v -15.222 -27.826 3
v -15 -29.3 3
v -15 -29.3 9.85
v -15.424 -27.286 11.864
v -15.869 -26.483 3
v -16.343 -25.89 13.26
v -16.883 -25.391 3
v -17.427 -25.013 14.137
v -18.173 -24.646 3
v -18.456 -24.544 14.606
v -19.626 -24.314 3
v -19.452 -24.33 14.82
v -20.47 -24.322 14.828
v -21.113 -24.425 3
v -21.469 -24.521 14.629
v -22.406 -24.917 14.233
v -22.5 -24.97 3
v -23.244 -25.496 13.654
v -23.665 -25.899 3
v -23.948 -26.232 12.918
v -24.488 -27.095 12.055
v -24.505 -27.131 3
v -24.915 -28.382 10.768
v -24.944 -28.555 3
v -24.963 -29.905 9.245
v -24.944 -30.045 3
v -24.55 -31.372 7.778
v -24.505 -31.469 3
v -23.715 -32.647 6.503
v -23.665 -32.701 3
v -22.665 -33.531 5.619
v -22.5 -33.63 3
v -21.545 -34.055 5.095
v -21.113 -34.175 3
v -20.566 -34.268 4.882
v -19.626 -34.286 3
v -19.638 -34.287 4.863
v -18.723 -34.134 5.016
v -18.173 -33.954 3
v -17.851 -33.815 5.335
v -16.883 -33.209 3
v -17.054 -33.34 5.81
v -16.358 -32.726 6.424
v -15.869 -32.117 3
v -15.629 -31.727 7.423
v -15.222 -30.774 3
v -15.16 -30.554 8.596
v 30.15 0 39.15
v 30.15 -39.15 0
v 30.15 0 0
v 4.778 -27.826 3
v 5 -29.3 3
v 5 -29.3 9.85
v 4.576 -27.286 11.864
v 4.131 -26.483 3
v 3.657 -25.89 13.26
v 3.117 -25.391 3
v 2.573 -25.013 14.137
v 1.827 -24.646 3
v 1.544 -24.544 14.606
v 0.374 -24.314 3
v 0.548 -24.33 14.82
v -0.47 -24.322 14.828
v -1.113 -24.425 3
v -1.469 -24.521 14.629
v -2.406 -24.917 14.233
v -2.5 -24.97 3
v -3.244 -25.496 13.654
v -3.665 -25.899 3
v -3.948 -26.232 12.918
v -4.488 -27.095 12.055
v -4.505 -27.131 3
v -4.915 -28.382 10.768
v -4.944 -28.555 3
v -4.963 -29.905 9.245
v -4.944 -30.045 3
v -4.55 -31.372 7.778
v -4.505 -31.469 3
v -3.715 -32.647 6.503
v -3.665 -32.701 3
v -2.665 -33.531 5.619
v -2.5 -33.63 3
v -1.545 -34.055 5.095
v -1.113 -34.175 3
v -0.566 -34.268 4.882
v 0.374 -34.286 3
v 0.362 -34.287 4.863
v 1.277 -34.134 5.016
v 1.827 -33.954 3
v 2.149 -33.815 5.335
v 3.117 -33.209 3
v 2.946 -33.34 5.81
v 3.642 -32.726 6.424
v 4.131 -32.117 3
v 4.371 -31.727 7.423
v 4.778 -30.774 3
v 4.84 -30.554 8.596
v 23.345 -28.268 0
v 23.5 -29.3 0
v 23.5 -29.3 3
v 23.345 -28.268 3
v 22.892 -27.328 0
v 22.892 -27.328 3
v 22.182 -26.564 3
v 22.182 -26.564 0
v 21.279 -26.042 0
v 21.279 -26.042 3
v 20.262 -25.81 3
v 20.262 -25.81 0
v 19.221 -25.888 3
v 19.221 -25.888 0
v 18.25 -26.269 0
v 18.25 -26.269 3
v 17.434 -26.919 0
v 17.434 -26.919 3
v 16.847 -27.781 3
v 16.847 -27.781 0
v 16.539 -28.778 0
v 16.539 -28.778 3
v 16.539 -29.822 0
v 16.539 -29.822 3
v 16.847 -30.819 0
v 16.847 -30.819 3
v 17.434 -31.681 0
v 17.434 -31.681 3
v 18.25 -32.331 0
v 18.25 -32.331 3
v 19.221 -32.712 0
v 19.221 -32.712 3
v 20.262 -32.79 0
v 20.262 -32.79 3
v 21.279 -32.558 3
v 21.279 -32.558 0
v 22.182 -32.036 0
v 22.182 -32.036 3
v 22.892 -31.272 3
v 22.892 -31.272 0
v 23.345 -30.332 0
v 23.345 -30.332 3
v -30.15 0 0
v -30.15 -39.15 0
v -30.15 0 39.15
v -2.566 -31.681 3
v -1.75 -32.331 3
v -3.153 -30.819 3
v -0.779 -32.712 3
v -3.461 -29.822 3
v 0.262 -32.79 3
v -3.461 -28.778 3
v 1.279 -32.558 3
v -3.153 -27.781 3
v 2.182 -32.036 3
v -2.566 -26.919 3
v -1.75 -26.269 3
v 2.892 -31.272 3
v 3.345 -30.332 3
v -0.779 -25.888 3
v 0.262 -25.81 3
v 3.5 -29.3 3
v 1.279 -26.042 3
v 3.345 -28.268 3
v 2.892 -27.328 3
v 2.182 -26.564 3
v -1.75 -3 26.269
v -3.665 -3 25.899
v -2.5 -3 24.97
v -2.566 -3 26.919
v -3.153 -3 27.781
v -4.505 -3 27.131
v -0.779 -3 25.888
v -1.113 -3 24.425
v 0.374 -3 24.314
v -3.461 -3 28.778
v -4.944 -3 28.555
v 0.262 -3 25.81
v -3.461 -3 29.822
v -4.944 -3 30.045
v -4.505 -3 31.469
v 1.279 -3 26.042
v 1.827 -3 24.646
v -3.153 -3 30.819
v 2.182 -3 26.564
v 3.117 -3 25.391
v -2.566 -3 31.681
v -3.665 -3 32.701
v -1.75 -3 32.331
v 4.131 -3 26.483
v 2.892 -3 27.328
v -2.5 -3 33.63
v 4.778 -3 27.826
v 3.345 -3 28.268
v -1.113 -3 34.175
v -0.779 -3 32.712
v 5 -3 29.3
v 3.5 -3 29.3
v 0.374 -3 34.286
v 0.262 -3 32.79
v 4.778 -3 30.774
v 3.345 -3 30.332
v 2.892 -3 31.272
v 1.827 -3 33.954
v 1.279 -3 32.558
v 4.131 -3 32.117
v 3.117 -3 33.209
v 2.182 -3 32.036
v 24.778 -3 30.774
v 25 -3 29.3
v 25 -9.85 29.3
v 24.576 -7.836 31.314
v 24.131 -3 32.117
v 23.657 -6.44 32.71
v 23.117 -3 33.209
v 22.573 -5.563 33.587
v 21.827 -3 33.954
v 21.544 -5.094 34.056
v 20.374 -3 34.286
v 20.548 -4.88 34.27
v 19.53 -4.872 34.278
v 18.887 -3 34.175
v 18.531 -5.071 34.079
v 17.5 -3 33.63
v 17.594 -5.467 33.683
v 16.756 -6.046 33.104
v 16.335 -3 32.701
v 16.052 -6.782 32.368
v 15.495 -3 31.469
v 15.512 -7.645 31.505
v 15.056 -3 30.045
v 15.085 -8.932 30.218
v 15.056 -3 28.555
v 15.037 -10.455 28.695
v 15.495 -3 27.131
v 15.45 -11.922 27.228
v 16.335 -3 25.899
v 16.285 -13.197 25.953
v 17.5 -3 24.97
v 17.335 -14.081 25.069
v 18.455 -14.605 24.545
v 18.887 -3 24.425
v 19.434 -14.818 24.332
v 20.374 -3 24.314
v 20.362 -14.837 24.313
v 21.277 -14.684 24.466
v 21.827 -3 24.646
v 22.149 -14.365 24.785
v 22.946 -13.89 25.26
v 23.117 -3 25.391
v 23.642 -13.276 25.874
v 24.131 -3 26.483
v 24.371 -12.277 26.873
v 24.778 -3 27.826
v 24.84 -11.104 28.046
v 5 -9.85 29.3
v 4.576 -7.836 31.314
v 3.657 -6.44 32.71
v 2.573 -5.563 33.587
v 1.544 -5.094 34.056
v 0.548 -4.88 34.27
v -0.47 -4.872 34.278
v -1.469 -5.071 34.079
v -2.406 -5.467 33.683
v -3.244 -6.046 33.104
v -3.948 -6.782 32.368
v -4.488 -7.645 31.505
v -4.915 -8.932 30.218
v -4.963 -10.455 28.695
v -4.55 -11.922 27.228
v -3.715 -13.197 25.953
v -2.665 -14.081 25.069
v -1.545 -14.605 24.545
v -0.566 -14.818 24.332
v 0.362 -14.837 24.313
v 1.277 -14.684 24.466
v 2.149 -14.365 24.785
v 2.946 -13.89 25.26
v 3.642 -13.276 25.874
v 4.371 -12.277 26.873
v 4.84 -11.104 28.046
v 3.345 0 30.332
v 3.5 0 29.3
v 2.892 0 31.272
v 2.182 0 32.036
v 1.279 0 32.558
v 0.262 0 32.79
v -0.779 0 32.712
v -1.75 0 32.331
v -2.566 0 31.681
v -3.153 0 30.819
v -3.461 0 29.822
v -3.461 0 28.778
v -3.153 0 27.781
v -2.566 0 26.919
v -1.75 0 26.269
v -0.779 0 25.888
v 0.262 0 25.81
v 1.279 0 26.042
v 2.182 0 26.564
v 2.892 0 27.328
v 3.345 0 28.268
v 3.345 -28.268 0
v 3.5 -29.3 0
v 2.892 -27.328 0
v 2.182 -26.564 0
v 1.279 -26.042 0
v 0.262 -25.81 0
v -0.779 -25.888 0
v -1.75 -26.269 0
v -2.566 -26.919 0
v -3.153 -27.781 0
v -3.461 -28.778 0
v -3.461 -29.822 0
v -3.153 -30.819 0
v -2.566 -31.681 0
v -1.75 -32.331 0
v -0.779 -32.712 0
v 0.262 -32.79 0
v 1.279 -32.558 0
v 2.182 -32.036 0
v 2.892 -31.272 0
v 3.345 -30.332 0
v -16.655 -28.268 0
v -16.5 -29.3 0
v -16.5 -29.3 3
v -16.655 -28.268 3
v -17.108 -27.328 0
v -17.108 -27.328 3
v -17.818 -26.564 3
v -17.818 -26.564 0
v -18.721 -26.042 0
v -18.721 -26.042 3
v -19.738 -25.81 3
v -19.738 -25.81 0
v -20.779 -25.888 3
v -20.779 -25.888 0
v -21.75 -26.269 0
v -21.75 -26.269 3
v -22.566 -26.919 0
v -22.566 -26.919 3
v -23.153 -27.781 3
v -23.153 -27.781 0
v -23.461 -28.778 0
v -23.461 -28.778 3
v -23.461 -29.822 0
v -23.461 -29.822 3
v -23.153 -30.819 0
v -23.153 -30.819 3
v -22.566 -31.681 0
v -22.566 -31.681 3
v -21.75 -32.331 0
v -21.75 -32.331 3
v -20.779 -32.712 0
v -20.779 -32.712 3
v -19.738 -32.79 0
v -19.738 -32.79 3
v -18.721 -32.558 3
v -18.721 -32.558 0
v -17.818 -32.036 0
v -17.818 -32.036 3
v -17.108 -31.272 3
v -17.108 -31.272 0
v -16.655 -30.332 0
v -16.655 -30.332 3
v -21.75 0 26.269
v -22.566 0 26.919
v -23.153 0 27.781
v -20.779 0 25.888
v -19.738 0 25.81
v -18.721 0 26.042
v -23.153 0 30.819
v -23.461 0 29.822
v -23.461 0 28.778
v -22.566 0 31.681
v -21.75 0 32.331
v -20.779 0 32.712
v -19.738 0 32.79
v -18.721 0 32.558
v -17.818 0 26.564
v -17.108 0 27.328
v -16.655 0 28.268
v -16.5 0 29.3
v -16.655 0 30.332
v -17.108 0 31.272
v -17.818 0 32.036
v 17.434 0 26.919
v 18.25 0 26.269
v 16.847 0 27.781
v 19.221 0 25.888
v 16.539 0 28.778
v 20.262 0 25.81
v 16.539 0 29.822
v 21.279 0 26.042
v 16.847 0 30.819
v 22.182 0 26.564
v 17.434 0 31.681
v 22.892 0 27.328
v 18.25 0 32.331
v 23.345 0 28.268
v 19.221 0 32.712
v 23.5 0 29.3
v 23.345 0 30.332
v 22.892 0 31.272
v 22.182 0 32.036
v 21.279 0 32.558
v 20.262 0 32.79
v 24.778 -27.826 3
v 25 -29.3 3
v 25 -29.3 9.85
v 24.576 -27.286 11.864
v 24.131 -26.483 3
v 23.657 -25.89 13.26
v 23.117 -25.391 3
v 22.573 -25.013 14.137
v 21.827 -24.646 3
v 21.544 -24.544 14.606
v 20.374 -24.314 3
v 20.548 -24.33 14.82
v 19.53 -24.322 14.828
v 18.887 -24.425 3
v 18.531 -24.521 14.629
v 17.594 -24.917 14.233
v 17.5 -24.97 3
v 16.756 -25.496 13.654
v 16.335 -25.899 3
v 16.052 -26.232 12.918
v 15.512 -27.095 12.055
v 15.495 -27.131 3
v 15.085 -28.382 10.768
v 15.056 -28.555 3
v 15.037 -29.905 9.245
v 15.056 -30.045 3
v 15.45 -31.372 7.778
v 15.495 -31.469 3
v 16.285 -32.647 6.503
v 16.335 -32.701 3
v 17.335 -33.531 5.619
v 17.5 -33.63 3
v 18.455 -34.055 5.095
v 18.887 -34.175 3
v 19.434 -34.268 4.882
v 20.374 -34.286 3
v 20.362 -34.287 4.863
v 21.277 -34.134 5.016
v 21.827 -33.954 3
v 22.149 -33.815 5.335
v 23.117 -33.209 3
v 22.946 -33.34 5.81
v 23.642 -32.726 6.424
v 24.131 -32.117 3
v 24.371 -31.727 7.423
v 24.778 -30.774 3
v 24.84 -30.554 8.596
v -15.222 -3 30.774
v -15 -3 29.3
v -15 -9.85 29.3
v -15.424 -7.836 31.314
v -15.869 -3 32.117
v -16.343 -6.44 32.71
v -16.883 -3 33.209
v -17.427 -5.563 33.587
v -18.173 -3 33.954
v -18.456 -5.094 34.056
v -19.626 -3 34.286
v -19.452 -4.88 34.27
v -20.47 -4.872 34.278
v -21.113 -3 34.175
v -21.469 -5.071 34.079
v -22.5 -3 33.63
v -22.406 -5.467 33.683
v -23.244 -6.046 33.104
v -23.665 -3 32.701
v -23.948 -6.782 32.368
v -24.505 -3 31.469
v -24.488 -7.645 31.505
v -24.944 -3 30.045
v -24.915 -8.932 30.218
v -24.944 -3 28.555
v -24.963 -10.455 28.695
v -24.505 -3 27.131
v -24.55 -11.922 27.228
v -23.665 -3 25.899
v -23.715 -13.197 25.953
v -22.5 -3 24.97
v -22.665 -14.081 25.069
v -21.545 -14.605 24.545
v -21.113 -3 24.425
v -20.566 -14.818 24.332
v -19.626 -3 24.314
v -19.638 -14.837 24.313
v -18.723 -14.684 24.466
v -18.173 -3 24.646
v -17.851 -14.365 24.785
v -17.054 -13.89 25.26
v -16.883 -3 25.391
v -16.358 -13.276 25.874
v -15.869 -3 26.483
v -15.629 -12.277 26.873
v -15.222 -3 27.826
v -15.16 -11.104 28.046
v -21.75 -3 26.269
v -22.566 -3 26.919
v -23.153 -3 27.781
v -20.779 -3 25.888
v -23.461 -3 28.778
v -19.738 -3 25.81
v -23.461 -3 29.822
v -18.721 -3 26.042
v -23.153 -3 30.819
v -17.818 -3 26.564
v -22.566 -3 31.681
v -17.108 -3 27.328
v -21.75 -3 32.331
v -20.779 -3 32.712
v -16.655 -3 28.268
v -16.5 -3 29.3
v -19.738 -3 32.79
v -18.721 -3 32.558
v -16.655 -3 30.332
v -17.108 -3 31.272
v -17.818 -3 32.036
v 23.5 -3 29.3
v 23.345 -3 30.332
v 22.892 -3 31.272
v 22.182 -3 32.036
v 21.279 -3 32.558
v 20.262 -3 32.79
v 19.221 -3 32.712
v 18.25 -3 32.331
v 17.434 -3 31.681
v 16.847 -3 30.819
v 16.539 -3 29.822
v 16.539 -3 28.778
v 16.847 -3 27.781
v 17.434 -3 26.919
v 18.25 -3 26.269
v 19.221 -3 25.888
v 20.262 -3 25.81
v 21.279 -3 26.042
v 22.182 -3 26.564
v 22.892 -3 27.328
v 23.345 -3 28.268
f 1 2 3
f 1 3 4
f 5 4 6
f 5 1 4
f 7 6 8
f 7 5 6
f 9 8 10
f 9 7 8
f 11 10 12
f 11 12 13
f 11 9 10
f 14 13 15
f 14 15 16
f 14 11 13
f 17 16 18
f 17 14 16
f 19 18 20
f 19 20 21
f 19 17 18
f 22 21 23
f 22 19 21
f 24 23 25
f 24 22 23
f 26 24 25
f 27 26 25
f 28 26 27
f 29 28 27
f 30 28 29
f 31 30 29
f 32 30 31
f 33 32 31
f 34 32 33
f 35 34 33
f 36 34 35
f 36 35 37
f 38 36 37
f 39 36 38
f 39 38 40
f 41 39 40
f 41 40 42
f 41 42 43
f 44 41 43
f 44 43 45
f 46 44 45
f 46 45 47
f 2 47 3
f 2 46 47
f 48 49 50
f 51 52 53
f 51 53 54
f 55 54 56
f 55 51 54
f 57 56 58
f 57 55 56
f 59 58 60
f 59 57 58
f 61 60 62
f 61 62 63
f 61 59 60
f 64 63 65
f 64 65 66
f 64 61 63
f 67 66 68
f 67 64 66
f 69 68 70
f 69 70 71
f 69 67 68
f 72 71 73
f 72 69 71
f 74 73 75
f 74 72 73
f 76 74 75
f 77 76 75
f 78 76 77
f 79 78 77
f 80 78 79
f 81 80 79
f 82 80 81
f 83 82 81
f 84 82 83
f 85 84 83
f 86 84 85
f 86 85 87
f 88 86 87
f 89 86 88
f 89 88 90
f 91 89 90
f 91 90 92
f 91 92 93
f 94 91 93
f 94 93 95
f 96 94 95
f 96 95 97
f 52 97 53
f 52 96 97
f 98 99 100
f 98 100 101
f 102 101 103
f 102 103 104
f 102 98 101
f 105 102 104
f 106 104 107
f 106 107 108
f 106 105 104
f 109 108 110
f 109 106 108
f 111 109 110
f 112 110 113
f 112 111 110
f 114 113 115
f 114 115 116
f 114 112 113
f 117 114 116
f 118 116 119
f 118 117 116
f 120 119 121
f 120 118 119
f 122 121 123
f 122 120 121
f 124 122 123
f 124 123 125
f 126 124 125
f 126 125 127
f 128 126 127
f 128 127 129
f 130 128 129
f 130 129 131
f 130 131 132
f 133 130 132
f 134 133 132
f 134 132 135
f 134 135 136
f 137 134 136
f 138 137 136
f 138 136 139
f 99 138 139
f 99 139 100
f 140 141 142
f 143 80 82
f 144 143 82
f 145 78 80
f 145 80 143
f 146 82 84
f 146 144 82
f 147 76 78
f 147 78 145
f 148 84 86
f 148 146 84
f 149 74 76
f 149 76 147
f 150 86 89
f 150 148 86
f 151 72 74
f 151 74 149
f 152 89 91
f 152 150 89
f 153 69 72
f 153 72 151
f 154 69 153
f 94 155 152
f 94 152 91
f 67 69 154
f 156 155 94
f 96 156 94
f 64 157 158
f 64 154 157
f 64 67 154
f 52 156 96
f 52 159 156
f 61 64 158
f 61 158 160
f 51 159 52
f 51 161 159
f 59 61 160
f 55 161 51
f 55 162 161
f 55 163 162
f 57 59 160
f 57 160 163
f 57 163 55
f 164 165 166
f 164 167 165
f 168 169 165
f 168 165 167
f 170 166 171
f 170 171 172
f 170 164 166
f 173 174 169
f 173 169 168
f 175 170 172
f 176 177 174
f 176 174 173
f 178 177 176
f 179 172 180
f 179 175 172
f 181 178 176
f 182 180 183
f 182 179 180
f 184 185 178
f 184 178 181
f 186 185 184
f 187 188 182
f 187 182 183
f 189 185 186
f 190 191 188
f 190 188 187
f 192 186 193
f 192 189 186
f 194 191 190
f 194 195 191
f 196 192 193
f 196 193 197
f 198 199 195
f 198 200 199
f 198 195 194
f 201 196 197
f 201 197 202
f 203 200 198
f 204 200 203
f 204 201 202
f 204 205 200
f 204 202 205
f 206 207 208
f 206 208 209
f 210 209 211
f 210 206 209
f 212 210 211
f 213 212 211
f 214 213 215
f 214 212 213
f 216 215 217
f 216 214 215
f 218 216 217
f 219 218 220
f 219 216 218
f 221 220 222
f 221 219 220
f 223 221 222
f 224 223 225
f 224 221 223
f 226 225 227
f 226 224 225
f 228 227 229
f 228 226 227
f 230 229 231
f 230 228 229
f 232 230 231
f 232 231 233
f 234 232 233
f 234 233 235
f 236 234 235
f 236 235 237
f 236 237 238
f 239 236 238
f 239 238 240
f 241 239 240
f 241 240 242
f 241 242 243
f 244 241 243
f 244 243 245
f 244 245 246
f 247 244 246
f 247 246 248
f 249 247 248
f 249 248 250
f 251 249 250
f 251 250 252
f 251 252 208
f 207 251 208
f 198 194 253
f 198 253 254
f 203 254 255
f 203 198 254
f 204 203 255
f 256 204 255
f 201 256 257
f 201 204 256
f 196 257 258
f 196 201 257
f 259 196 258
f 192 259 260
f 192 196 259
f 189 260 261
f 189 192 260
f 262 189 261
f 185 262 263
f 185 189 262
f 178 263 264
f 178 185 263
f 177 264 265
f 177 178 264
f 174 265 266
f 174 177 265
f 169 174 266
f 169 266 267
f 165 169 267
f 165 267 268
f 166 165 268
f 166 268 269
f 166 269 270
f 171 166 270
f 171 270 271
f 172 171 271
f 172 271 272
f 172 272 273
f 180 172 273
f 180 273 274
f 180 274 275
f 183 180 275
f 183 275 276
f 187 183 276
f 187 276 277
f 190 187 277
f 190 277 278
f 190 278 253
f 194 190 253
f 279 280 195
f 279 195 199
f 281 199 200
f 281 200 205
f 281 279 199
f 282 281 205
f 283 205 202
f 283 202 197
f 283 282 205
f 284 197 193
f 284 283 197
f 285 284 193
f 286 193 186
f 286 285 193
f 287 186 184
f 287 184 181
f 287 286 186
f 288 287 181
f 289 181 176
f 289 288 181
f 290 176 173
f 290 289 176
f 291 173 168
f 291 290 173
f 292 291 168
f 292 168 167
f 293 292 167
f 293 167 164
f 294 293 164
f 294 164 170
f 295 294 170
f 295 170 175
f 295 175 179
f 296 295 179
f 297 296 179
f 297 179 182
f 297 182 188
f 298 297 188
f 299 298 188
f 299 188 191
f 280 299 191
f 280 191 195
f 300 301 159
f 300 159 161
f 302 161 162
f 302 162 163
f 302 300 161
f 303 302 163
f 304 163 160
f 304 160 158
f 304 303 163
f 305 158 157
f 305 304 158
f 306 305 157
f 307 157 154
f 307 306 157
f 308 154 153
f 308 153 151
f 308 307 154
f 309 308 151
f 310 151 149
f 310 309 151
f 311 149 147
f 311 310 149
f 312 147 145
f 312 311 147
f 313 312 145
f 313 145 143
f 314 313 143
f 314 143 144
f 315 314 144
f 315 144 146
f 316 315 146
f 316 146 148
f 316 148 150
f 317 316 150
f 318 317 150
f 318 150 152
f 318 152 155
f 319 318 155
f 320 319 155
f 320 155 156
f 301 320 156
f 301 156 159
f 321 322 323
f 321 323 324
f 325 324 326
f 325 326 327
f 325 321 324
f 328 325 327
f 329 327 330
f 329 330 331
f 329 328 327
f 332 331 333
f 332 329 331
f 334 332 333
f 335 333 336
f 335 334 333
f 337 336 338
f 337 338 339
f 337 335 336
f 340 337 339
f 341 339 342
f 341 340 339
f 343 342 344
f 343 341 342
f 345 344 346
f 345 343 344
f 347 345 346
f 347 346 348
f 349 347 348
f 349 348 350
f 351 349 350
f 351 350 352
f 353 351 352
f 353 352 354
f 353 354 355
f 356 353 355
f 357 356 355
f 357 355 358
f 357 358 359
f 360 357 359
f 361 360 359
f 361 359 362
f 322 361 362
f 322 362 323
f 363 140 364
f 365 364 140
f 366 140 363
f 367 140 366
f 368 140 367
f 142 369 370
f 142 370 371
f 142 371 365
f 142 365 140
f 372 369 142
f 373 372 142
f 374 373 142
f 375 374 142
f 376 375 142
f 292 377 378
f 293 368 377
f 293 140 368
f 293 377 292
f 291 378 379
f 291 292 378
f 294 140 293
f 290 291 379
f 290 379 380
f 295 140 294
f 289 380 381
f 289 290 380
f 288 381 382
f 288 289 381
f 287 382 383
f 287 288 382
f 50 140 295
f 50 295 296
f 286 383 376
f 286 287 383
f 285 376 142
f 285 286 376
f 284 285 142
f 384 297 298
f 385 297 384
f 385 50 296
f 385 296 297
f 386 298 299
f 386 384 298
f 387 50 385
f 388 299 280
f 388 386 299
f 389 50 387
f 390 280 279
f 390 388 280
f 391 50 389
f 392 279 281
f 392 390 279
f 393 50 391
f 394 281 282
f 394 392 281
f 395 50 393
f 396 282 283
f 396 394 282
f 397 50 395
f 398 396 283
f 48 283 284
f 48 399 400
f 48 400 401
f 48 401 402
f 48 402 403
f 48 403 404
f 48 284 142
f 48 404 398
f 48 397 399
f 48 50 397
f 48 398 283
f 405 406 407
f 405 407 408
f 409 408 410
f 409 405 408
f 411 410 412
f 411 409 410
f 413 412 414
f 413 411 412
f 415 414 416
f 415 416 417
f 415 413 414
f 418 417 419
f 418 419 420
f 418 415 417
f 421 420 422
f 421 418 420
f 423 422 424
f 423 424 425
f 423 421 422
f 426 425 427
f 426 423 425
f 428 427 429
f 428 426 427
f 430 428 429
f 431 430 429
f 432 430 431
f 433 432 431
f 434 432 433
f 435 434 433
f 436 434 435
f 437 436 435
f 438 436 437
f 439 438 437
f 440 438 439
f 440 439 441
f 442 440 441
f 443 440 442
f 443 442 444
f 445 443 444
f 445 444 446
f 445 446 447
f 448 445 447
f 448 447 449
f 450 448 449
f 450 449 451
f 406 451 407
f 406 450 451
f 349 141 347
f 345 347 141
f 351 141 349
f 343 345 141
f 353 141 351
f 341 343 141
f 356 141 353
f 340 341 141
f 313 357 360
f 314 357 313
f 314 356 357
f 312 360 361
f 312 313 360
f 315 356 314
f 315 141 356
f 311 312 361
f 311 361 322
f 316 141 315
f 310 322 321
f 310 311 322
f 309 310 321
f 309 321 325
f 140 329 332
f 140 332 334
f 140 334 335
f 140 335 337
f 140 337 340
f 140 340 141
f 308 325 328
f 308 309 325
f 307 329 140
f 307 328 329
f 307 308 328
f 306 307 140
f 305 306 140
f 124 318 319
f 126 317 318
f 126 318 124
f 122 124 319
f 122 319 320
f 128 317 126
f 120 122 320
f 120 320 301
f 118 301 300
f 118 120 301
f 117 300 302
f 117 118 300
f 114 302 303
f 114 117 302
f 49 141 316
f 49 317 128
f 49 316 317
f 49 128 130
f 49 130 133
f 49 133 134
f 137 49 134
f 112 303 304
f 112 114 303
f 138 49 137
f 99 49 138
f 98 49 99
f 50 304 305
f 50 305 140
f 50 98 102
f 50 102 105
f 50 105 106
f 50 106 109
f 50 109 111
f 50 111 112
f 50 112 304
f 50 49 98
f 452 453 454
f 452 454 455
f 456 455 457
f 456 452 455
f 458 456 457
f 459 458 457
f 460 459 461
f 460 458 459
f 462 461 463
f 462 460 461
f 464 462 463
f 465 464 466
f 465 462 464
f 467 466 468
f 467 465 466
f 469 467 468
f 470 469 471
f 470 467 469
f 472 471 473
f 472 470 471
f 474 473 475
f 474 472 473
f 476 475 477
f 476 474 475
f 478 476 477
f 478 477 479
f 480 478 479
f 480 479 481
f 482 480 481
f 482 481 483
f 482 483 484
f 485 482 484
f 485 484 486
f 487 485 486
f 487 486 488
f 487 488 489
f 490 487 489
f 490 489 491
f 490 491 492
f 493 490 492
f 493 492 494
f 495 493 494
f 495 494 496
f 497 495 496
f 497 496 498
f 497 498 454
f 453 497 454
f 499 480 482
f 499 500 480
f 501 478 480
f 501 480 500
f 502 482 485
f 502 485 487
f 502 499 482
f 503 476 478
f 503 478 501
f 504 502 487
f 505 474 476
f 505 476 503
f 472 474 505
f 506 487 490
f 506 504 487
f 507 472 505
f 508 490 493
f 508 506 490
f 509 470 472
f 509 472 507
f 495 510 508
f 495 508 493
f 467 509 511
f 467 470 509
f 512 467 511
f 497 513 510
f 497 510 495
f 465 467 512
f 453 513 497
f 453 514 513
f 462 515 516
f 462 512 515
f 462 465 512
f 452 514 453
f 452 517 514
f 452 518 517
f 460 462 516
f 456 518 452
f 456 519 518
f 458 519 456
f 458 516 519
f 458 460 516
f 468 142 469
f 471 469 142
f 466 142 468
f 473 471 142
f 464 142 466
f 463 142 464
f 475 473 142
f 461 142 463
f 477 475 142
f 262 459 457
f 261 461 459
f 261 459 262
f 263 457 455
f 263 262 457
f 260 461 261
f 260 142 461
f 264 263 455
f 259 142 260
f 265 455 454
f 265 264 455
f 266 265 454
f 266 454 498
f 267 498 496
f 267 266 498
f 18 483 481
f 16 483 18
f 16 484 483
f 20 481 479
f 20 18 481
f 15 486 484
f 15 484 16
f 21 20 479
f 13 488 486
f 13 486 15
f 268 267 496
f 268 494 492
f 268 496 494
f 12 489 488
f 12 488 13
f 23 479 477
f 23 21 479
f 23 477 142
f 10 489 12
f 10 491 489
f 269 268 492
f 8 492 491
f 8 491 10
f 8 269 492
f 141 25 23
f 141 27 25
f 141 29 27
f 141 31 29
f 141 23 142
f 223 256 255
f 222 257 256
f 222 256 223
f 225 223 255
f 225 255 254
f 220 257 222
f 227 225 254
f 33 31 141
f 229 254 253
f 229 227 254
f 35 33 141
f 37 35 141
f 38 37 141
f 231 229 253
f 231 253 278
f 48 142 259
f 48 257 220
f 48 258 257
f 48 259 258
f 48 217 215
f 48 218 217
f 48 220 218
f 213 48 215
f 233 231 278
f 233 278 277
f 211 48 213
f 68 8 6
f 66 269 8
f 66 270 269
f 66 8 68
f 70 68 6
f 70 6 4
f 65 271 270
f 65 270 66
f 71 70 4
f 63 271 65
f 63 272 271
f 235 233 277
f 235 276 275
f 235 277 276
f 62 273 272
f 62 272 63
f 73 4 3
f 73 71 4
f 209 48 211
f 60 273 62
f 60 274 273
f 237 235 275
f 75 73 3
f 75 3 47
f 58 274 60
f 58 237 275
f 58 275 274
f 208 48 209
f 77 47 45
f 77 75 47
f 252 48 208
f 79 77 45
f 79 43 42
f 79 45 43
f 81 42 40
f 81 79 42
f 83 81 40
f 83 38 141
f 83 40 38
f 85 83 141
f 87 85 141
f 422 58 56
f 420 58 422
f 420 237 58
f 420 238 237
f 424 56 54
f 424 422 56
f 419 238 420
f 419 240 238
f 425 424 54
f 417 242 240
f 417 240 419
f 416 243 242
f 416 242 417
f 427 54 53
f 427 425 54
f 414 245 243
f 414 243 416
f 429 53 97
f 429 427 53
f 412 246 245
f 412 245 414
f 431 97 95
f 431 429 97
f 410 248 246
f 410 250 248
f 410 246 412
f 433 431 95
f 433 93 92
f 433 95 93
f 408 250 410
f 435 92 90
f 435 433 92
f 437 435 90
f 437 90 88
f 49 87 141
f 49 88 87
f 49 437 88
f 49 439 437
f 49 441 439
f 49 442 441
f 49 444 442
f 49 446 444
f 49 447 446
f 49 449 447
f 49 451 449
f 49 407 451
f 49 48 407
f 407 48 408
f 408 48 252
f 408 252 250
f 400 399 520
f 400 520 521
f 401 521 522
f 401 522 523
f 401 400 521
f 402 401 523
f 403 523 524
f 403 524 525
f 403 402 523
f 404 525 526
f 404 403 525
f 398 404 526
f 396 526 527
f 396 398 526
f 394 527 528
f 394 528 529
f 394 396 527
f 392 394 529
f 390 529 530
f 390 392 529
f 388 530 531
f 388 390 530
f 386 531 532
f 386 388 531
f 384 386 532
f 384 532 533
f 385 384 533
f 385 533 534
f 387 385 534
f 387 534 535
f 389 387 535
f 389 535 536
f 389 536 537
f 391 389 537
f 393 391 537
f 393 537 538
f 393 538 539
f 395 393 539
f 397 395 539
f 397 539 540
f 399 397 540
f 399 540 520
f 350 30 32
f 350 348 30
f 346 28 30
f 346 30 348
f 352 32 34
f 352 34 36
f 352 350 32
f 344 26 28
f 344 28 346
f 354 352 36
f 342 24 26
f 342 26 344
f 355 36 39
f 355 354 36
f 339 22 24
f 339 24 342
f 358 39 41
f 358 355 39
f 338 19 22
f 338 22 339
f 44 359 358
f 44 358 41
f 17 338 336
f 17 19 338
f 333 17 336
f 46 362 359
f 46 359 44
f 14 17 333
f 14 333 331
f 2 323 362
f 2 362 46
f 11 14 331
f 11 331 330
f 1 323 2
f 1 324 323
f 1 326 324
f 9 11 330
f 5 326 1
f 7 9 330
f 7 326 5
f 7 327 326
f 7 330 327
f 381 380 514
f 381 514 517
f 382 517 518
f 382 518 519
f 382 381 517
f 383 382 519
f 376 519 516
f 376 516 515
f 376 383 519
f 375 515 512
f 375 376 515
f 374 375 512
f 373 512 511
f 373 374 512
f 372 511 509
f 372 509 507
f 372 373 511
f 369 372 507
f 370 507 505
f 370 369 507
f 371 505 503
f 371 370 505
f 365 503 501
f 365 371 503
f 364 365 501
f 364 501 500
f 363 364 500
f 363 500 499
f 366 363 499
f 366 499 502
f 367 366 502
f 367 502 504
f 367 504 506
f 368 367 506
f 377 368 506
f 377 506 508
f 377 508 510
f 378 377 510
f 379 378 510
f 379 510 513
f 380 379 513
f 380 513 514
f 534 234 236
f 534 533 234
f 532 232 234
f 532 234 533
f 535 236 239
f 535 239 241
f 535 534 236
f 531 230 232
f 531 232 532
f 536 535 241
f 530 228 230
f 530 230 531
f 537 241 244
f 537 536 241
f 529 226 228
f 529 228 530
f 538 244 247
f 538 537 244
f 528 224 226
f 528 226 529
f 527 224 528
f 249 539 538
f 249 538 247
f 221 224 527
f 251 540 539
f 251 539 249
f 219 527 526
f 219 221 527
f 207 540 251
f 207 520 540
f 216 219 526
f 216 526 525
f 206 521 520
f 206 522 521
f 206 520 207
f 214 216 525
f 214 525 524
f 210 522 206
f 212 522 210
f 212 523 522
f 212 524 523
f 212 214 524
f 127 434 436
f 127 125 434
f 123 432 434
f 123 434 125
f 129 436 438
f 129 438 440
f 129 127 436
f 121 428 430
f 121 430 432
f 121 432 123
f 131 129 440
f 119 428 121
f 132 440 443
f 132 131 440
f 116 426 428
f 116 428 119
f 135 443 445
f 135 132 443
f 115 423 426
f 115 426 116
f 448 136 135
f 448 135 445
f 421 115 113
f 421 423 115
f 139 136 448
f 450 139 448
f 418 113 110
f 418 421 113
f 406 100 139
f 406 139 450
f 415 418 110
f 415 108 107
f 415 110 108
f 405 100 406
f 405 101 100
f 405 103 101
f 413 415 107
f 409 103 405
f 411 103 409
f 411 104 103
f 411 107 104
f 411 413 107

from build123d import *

# Parameters (mm, degrees)
F1_DEPTH      = 30.15
F1_DEPTH_BACK = 30.15
F2_R          = 3.5
F3_DEPTH      = 25
F4_START      = 3
F2_R_2        = 5
F4_DEPTH      = 22
F5_R          = 3.5
F6_DEPTH      = 25
F7_START      = 3
F5_R_2        = 5
F7_DEPTH      = 22


with BuildPart() as f1:
    # F0 (on Right) → F1 (new body, two sides)
    with BuildSketch(Plane.YZ) as f1_sk:
        Polygon((-39.15, 0), (0, 0), (0, 39.15), align=None)
    extrude(amount=F1_DEPTH)
    extrude(f1_sk.sketch, amount=-F1_DEPTH_BACK)

    # F2 (on Front) → F3 (cut)
    with BuildSketch(Plane.XZ):
        with Locations((-20, 29.3)):
            Circle(F2_R)
        with Locations((0, 29.3)):
            Circle(F2_R)
        with Locations((20, 29.3)):
            Circle(F2_R)
    extrude(amount=F3_DEPTH, mode=Mode.SUBTRACT)

    # F2 (on Front) → F4 (cut)
    with BuildSketch(Plane.XZ.offset(F4_START)):
        with Locations((20, 29.3)):
            Circle(F2_R_2)
        with Locations((20, 29.3)):
            Circle(F2_R, mode=Mode.SUBTRACT)
        with Locations((0, 29.3)):
            Circle(F2_R_2)
        with Locations((0, 29.3)):
            Circle(F2_R, mode=Mode.SUBTRACT)
        with Locations((-20, 29.3)):
            Circle(F2_R_2)
        with Locations((-20, 29.3)):
            Circle(F2_R, mode=Mode.SUBTRACT)
    extrude(amount=F4_DEPTH, mode=Mode.SUBTRACT)

    # F5 (on Top) → F6 (cut)
    with BuildSketch(Plane.XY):
        with Locations((20, -29.3)):
            Circle(F5_R)
        with Locations((0, -29.3)):
            Circle(F5_R)
        with Locations((-20, -29.3)):
            Circle(F5_R)
    extrude(amount=F6_DEPTH, mode=Mode.SUBTRACT)

    # F5 (on Top) → F7 (cut)
    with BuildSketch(Plane.XY.offset(F7_START)):
        with Locations((-20, -29.3)):
            Circle(F5_R_2)
        with Locations((-20, -29.3)):
            Circle(F5_R, mode=Mode.SUBTRACT)
        with Locations((0, -29.3)):
            Circle(F5_R_2)
        with Locations((0, -29.3)):
            Circle(F5_R, mode=Mode.SUBTRACT)
        with Locations((20, -29.3)):
            Circle(F5_R_2)
        with Locations((20, -29.3)):
            Circle(F5_R, mode=Mode.SUBTRACT)
    extrude(amount=F7_DEPTH, mode=Mode.SUBTRACT)


solid = f1.part
